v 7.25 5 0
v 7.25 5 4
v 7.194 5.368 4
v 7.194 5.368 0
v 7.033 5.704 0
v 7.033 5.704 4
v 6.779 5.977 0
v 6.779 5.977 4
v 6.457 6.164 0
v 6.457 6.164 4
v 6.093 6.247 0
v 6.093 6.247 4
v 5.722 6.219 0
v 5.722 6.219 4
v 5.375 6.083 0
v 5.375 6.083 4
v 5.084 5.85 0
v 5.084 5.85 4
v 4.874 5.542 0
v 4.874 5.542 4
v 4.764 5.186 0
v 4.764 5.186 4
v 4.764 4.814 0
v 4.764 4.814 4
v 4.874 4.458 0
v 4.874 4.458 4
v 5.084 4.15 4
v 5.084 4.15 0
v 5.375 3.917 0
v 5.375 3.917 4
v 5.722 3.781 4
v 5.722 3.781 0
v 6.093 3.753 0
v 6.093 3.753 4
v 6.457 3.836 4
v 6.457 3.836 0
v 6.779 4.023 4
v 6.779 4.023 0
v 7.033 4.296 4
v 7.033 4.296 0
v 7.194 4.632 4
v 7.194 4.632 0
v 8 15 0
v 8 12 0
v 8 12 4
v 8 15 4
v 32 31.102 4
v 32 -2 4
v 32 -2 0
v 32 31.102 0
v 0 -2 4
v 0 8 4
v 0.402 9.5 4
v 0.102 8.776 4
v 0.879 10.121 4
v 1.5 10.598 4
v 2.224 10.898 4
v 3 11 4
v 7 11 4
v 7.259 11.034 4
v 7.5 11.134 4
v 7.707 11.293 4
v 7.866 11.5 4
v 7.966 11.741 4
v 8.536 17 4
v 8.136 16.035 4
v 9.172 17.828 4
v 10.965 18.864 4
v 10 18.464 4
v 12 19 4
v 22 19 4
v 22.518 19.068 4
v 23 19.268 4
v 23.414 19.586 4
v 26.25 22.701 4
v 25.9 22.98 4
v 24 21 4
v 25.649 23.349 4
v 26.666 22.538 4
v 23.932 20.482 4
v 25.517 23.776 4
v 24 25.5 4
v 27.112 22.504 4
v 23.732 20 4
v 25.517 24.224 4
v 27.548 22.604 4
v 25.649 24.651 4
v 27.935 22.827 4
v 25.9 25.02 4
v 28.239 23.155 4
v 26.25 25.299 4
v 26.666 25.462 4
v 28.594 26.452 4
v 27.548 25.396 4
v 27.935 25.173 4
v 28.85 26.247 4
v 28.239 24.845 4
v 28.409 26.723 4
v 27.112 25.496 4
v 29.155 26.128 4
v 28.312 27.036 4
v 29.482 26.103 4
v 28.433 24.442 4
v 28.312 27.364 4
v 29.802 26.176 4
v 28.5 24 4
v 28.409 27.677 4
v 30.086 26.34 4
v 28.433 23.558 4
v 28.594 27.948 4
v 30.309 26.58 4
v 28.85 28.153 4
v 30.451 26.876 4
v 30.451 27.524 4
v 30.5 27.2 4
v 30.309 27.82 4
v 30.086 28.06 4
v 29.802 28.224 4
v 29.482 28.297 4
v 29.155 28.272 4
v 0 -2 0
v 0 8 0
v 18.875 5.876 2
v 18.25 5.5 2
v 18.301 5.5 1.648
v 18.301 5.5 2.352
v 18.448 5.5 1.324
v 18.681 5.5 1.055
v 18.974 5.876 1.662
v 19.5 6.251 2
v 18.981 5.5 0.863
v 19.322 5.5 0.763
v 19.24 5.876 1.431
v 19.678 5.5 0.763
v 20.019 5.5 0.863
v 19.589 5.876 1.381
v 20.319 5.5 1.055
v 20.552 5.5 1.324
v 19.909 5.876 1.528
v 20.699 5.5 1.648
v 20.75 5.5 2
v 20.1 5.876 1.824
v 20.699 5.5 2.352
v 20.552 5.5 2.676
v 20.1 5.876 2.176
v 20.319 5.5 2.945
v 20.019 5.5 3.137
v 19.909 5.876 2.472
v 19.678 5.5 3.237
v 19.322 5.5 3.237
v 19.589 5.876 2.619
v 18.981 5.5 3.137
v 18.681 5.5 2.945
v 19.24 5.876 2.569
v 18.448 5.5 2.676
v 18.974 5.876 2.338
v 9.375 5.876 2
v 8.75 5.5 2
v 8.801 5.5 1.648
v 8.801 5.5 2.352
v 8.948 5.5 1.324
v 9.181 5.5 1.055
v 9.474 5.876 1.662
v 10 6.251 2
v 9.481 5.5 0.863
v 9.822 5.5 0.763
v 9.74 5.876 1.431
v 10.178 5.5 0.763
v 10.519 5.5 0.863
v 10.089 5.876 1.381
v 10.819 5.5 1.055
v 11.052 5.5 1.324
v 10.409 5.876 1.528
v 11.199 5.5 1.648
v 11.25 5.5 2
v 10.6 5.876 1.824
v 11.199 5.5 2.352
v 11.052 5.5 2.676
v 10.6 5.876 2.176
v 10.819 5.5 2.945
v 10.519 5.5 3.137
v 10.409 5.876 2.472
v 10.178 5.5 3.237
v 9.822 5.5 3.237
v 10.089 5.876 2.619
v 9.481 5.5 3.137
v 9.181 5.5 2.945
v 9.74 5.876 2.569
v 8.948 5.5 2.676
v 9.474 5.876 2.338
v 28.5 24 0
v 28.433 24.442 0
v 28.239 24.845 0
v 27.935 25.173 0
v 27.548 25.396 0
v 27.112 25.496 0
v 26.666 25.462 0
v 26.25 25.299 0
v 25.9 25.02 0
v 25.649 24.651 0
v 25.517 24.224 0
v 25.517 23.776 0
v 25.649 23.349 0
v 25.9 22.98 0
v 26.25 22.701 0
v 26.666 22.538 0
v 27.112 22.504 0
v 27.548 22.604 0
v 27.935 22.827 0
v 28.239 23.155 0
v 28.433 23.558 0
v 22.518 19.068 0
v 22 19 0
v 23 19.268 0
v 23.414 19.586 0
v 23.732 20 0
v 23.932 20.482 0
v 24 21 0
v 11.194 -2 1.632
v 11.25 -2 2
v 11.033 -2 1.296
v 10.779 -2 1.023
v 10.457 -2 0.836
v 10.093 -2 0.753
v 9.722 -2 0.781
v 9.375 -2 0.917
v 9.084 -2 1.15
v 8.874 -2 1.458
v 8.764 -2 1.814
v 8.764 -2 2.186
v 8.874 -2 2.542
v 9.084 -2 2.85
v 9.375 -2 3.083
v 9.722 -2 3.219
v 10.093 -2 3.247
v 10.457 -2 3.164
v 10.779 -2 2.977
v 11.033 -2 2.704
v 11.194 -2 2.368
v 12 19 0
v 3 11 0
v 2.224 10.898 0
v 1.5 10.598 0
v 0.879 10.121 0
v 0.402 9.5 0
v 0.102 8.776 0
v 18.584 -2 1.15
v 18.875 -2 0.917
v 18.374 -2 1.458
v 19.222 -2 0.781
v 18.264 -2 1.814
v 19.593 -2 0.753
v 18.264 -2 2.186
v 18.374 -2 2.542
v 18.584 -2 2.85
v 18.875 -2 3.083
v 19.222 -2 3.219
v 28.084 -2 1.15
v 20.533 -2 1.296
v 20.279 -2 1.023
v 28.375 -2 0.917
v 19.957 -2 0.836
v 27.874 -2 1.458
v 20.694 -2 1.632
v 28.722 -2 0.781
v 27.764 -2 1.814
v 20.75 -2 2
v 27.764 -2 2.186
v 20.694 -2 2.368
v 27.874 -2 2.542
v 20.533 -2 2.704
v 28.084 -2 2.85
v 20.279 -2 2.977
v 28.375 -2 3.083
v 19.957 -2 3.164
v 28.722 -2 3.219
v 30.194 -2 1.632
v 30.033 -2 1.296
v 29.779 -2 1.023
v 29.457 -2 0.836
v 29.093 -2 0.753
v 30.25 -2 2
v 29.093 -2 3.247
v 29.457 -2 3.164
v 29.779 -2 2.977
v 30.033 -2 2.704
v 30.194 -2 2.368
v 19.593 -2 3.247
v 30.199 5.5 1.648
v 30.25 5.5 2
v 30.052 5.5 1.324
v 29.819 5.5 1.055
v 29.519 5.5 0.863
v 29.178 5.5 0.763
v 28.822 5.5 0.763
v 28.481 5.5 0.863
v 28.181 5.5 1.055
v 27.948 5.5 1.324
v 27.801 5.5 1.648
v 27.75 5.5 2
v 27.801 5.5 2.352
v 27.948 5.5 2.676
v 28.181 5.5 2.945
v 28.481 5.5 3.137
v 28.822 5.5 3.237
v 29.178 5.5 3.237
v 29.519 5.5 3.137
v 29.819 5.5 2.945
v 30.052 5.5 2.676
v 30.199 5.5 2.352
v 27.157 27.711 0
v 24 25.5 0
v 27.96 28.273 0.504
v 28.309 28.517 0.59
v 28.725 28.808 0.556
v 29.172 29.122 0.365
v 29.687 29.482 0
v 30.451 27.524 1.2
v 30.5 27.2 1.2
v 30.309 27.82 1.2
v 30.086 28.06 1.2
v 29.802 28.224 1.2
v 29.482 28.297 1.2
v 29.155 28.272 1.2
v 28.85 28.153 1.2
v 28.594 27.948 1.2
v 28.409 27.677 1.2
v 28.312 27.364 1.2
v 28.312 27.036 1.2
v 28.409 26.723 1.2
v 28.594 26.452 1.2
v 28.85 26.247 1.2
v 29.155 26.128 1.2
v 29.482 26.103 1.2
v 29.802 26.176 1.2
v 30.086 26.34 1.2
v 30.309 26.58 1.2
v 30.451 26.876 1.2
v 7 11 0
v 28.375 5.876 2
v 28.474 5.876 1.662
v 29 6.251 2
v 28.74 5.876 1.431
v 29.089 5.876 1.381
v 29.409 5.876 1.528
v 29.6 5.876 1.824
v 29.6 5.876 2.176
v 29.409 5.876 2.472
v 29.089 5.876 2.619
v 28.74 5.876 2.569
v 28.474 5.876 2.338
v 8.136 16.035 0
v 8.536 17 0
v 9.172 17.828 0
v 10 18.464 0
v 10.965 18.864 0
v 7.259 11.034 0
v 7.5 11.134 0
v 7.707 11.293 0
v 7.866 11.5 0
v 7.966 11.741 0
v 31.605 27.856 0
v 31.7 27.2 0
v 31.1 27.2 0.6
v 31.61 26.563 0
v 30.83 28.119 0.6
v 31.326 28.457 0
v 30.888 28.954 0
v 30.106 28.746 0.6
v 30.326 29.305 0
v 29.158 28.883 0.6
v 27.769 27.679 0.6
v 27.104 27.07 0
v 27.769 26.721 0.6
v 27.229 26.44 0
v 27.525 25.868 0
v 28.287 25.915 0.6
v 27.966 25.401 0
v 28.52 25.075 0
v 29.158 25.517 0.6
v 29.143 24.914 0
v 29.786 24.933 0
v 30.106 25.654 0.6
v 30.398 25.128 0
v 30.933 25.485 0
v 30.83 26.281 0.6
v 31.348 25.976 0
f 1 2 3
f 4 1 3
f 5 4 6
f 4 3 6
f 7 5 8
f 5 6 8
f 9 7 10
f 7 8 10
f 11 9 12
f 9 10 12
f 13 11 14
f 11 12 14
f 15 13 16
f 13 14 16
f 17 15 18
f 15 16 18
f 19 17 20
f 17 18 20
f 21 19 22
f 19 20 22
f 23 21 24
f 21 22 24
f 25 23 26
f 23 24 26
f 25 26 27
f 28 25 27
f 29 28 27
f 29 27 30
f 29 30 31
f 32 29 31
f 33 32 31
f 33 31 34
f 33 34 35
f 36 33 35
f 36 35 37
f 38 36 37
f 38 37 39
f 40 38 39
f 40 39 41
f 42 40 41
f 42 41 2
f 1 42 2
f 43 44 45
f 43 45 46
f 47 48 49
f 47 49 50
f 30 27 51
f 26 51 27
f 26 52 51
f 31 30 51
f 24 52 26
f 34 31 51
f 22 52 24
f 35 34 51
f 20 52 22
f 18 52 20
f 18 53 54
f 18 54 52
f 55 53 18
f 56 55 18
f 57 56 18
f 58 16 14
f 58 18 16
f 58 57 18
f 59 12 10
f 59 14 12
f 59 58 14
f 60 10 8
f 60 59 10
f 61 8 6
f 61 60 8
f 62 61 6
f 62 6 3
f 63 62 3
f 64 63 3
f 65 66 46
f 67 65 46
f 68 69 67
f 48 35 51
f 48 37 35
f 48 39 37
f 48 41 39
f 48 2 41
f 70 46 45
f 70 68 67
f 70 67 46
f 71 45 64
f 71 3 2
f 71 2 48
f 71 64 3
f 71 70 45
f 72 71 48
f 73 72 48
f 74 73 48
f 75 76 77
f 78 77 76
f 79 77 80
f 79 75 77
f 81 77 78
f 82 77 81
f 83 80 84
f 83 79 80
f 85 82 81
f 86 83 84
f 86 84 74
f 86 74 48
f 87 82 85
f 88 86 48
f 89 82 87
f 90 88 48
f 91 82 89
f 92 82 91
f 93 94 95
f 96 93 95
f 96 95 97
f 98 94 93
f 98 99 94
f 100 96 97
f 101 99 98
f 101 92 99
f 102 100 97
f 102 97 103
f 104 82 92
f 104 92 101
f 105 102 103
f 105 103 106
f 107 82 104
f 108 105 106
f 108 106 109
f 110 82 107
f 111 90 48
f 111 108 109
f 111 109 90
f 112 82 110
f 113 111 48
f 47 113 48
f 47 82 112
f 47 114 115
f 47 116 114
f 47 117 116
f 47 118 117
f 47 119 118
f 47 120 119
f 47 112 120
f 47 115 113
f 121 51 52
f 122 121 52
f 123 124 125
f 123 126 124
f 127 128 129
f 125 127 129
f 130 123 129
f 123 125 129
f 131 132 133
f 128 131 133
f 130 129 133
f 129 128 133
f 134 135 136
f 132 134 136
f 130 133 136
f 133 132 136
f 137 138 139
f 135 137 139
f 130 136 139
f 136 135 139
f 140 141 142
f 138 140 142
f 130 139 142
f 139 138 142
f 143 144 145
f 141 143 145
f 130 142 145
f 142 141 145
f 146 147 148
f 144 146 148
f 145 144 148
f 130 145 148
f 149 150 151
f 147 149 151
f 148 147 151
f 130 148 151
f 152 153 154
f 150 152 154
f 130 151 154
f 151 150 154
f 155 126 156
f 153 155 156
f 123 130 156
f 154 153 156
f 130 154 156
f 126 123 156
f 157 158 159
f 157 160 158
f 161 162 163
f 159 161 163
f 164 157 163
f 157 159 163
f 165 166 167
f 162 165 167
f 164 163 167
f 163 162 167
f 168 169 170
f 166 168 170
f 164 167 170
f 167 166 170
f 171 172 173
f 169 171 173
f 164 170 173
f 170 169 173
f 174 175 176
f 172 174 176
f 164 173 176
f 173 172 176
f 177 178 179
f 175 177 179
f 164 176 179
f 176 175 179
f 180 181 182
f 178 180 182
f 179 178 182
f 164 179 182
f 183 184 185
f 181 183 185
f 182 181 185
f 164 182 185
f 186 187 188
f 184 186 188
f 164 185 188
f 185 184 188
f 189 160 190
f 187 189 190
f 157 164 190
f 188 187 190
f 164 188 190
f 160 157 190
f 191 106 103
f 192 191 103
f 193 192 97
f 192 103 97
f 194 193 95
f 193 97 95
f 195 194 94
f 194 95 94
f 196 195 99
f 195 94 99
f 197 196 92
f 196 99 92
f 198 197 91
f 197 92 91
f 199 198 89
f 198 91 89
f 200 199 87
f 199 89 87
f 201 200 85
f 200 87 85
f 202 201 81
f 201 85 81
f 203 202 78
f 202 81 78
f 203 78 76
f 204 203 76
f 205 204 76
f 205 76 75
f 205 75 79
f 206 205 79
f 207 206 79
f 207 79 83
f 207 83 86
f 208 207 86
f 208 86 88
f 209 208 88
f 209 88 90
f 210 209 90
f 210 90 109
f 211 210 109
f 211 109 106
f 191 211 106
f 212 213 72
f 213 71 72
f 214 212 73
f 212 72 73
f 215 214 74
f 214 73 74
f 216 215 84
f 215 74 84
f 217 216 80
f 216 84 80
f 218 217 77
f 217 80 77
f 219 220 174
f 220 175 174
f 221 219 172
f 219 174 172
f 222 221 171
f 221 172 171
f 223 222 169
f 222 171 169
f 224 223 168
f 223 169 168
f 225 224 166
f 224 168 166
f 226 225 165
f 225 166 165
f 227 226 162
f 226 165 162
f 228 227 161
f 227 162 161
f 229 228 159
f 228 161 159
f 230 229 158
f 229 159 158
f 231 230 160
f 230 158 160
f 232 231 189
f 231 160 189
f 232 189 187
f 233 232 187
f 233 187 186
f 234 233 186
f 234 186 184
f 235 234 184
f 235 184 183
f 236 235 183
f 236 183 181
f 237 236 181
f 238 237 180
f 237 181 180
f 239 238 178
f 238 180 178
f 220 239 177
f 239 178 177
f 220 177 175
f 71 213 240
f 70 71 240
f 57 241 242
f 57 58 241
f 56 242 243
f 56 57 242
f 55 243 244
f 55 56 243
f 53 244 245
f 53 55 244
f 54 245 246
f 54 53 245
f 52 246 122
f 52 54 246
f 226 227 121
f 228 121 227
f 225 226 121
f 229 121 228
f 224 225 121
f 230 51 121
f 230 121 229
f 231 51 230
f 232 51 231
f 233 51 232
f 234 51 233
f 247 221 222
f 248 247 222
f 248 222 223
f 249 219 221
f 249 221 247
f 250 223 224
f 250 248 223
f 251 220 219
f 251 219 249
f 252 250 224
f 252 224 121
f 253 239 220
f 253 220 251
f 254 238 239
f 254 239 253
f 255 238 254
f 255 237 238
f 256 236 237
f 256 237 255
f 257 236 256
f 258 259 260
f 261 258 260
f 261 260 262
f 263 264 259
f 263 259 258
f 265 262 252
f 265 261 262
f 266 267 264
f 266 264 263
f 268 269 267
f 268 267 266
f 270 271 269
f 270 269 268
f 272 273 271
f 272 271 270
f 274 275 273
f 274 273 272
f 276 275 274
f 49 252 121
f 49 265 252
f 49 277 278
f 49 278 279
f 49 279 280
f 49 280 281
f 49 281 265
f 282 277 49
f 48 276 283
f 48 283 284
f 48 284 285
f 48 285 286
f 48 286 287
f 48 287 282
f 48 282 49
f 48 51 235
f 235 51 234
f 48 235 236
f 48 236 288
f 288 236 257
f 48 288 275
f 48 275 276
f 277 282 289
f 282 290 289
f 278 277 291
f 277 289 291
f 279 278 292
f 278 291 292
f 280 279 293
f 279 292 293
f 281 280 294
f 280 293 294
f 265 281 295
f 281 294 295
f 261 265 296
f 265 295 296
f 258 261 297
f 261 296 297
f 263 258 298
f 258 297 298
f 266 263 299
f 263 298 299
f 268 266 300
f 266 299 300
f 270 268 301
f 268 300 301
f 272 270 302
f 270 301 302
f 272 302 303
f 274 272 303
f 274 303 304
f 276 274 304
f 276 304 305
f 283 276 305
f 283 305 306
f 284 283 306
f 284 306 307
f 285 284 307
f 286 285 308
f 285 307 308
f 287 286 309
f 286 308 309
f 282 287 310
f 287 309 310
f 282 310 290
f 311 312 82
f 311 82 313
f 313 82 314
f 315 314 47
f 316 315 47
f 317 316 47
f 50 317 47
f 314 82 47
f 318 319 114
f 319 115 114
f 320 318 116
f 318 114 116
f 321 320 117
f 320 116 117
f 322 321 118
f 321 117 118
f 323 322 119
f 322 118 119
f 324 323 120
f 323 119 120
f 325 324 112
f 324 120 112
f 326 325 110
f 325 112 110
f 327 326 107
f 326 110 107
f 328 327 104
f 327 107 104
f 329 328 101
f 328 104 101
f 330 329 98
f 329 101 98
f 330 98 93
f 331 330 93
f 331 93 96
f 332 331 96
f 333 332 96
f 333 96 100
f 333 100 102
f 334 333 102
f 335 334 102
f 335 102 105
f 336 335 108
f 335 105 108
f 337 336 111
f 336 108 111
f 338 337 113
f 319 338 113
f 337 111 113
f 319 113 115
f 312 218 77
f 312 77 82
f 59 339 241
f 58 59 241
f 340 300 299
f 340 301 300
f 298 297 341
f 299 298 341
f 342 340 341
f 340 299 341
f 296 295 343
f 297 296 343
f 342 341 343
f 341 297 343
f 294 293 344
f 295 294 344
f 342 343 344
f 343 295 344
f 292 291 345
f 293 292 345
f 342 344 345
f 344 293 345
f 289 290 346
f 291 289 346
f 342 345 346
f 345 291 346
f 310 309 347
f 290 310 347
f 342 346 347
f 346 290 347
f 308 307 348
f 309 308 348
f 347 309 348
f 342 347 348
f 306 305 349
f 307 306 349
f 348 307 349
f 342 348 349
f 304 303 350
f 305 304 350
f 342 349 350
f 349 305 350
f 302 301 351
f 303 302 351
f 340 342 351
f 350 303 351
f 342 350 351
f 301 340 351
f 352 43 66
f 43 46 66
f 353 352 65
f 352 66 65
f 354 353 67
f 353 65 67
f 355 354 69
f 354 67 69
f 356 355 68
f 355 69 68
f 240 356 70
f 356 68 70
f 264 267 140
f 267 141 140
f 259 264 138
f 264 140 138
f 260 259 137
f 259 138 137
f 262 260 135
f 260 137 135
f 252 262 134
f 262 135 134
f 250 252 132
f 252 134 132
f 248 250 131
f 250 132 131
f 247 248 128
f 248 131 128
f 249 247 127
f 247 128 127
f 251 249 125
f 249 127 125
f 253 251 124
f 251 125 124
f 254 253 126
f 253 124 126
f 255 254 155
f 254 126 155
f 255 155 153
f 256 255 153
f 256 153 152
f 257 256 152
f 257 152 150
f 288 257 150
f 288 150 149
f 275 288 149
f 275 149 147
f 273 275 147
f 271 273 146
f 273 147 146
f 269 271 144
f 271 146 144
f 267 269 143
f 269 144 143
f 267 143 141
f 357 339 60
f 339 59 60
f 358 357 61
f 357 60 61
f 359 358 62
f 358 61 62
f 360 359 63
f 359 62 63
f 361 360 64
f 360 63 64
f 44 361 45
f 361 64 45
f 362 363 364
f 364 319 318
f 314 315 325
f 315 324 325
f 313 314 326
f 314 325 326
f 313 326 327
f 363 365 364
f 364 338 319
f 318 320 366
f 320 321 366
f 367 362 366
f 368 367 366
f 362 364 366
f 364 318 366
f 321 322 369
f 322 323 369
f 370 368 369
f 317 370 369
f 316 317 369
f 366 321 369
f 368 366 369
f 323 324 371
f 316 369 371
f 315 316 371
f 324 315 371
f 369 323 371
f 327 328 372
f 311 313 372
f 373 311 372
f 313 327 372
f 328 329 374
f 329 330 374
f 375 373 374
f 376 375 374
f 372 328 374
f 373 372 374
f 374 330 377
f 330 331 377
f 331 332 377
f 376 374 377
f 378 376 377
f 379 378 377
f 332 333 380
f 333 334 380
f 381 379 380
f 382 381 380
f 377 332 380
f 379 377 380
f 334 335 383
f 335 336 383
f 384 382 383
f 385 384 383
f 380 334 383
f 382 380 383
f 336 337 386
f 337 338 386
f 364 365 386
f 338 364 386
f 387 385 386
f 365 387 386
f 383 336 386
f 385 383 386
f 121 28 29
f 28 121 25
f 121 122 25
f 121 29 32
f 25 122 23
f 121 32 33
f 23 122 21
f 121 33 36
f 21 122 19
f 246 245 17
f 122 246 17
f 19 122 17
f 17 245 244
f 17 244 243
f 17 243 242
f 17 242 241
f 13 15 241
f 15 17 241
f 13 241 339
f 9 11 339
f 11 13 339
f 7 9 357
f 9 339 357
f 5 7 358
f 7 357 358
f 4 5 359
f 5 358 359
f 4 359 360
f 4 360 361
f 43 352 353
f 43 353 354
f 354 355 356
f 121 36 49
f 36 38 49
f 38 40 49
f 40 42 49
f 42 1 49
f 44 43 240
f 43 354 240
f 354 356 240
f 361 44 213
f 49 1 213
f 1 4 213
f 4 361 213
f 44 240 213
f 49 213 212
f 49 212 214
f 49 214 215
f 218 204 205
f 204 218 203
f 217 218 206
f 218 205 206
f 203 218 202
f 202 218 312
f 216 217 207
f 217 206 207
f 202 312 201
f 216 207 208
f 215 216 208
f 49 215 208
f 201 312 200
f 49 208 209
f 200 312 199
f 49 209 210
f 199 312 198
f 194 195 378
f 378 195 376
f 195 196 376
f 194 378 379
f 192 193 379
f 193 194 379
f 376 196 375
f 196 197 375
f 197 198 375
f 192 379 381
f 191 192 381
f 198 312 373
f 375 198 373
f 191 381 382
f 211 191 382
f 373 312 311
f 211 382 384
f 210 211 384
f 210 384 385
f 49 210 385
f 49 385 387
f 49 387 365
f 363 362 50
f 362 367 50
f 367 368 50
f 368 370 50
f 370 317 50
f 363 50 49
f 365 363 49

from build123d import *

# Parameters (mm, degrees)
SKETCH1_W                     = 32
SKETCH1_H                     = 27.5
BOSS_EXTRUDE1_DEPTH           = 4
SKETCH2_W                     = 8
SKETCH2_H                     = 14.5
CUT_EXTRUDE1_DEPTH            = 42.112650121
SKETCH3_W                     = 16
SKETCH3_H                     = 6.5
CUT_EXTRUDE2_DEPTH            = 42.112650121
DRAFT1_ANGLE                  = 35.000000002
F_3_0_3_DIAMETER_HOLE1_D      = 3
CSK_FOR_M3_SFHCS1_D           = 2.2
CSK_FOR_M3_SFHCS1_DEPTH       = 9.5
CSK_FOR_M3_SFHCS1_CSINK_D     = 4.6
CSK_FOR_M3_SFHCS1_CSINK_ANGLE = 90
CSK_FOR_M3_SFHCS1_TIP         = 0.660946681
M3X0_5_TAPPED_HOLE2_D         = 2.5
M3X0_5_TAPPED_HOLE2_DEPTH     = 7.5
M3X0_5_TAPPED_HOLE2_TIP       = 0.751075774
FILLET1_R                     = 1
FILLET2_R                     = 2
FILLET3_R                     = 3
FILLET4_R                     = 4
M3X0_5_TAPPED_HOLE1_D         = 2.5


with BuildPart() as part:
    # Sketch1 → Boss-Extrude1 (new body)
    with BuildSketch(Plane.XY.offset(4)):
        with Locations((16, 11.75)):
            Rectangle(SKETCH1_W, SKETCH1_H)
    extrude(amount=-BOSS_EXTRUDE1_DEPTH)

    # Sketch2 → Cut-Extrude1 (cut, through all)
    with BuildSketch(Plane(origin=(0, 0, 0), x_dir=(-1, 0, 0), z_dir=(0, 0, -1))):
        with Locations((-4, 18.25)):
            Rectangle(SKETCH2_W, SKETCH2_H)
    extrude(amount=-CUT_EXTRUDE1_DEPTH, mode=Mode.SUBTRACT)

    # Sketch3 → Cut-Extrude2 (cut, through all)
    with BuildSketch(Plane(origin=(0, 0, 0), x_dir=(-1, 0, 0), z_dir=(0, 0, -1))):
        with Locations((-16, 22.25)):
            Rectangle(SKETCH3_W, SKETCH3_H)
    extrude(amount=-CUT_EXTRUDE2_DEPTH, mode=Mode.SUBTRACT)

    # Draft1
    draft1_faces = [part.faces().sort_by_distance(p)[0] for p in [
        (28, 25.5, 2),
    ]]
    draft(draft1_faces, Plane(origin=(24, 25.5, 4), x_dir=(0, 0, -1), z_dir=(-1, 0, 0)), DRAFT1_ANGLE)

    # Ø3.0 (3) Diameter Hole1 (through all)
    with Locations(Plane(origin=(0, 0, 0), x_dir=(-1, 0, 0), z_dir=(0, 0, -1))):
        with Locations((-27, 24)):
            Hole(F_3_0_3_DIAMETER_HOLE1_D / 2)

    # CSK for M3 SFHCS1
    with Locations(Plane(origin=(0, 0, 0), x_dir=(-1, 0, 0), z_dir=(0, 0, -1))):
        with Locations((-29.4, 27.2)):
            CounterSinkHole(CSK_FOR_M3_SFHCS1_D / 2, CSK_FOR_M3_SFHCS1_CSINK_D / 2, depth=CSK_FOR_M3_SFHCS1_DEPTH, counter_sink_angle=CSK_FOR_M3_SFHCS1_CSINK_ANGLE)
            with Locations((0, 0, -(CSK_FOR_M3_SFHCS1_DEPTH + CSK_FOR_M3_SFHCS1_TIP / 2))):  # 118° drill point
                Cone(0, CSK_FOR_M3_SFHCS1_D / 2, CSK_FOR_M3_SFHCS1_TIP, mode=Mode.SUBTRACT)

    # M3x0.5 Tapped Hole2
    with Locations(Plane(origin=(0, -2, 0), x_dir=(-1, 0, 0), z_dir=(0, -1, 0))):
        with Locations((-10, -2), (-19.5, -2), (-29, -2)):
            Hole(M3X0_5_TAPPED_HOLE2_D / 2, depth=M3X0_5_TAPPED_HOLE2_DEPTH)
            with Locations((0, 0, -(M3X0_5_TAPPED_HOLE2_DEPTH + M3X0_5_TAPPED_HOLE2_TIP / 2))):  # 118° drill point
                Cone(0, M3X0_5_TAPPED_HOLE2_D / 2, M3X0_5_TAPPED_HOLE2_TIP, mode=Mode.SUBTRACT)

    # Fillet1
    fillet1_edges = [part.edges().sort_by_distance(p)[0] for p in [
        (8, 11, 2),
    ]]
    fillet(fillet1_edges, radius=FILLET1_R)

    # Fillet2
    fillet2_edges = [part.edges().sort_by_distance(p)[0] for p in [
        (24, 19, 2),
    ]]
    fillet(fillet2_edges, radius=FILLET2_R)

    # Fillet3
    fillet3_edges = [part.edges().sort_by_distance(p)[0] for p in [
        (0, 11, 2),
    ]]
    fillet(fillet3_edges, radius=FILLET3_R)

    # Fillet4
    fillet4_edges = [part.edges().sort_by_distance(p)[0] for p in [
        (8, 19, 2),
    ]]
    fillet(fillet4_edges, radius=FILLET4_R)

    # M3x0.5 Tapped Hole1 (through all)
    with Locations(Plane(origin=(6, 5, 0), x_dir=(-1, 0, 0), z_dir=(0, 0, -1))):
        with Locations((0, 0)):
            Hole(M3X0_5_TAPPED_HOLE1_D / 2)


solid = part.part
